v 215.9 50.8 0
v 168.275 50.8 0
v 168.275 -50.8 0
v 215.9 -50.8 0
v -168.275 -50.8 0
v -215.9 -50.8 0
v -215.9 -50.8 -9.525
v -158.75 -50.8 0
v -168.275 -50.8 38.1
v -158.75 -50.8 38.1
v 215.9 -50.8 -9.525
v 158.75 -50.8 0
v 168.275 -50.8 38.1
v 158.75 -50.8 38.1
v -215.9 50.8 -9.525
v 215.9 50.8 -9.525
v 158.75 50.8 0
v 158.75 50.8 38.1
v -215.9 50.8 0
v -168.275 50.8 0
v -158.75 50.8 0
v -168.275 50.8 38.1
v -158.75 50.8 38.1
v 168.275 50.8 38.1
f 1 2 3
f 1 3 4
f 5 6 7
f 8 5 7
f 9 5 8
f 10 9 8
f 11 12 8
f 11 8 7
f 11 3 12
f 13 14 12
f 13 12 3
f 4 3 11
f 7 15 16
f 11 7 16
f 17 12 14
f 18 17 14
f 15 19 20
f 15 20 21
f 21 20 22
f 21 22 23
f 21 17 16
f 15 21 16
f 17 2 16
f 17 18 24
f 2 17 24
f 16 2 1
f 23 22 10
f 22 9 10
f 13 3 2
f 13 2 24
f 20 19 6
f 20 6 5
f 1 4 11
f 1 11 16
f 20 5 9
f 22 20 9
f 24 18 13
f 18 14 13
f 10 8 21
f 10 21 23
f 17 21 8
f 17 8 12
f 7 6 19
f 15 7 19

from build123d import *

# Parameters (mm, degrees)
F0_W     = 431.8
F0_H     = 101.6
F1_DEPTH = 9.525
F2_W     = 9.525
F2_H     = 38.1
F3_DEPTH = 50.8
F4_W     = 9.525
F4_H     = 38.1
F5_DEPTH = 50.8


with BuildPart() as f1:
    # F0 (on Top) → F1 (new body)
    with BuildSketch(Plane.XY):
        Rectangle(F0_W, F0_H)
    extrude(amount=-F1_DEPTH)

    # F2 (on Front) → F3 (join, symmetric)
    with BuildSketch(Plane.XZ):
        with Locations((-163.5125, 19.05)):
            Rectangle(F2_W, F2_H)
    extrude(amount=F3_DEPTH, both=True)

    # F4 (on Front) → F5 (join, symmetric)
    with BuildSketch(Plane.XZ):
        with Locations((163.5125, 19.05)):
            Rectangle(F4_W, F4_H)
    extrude(amount=F5_DEPTH, both=True)


solid = f1.part
